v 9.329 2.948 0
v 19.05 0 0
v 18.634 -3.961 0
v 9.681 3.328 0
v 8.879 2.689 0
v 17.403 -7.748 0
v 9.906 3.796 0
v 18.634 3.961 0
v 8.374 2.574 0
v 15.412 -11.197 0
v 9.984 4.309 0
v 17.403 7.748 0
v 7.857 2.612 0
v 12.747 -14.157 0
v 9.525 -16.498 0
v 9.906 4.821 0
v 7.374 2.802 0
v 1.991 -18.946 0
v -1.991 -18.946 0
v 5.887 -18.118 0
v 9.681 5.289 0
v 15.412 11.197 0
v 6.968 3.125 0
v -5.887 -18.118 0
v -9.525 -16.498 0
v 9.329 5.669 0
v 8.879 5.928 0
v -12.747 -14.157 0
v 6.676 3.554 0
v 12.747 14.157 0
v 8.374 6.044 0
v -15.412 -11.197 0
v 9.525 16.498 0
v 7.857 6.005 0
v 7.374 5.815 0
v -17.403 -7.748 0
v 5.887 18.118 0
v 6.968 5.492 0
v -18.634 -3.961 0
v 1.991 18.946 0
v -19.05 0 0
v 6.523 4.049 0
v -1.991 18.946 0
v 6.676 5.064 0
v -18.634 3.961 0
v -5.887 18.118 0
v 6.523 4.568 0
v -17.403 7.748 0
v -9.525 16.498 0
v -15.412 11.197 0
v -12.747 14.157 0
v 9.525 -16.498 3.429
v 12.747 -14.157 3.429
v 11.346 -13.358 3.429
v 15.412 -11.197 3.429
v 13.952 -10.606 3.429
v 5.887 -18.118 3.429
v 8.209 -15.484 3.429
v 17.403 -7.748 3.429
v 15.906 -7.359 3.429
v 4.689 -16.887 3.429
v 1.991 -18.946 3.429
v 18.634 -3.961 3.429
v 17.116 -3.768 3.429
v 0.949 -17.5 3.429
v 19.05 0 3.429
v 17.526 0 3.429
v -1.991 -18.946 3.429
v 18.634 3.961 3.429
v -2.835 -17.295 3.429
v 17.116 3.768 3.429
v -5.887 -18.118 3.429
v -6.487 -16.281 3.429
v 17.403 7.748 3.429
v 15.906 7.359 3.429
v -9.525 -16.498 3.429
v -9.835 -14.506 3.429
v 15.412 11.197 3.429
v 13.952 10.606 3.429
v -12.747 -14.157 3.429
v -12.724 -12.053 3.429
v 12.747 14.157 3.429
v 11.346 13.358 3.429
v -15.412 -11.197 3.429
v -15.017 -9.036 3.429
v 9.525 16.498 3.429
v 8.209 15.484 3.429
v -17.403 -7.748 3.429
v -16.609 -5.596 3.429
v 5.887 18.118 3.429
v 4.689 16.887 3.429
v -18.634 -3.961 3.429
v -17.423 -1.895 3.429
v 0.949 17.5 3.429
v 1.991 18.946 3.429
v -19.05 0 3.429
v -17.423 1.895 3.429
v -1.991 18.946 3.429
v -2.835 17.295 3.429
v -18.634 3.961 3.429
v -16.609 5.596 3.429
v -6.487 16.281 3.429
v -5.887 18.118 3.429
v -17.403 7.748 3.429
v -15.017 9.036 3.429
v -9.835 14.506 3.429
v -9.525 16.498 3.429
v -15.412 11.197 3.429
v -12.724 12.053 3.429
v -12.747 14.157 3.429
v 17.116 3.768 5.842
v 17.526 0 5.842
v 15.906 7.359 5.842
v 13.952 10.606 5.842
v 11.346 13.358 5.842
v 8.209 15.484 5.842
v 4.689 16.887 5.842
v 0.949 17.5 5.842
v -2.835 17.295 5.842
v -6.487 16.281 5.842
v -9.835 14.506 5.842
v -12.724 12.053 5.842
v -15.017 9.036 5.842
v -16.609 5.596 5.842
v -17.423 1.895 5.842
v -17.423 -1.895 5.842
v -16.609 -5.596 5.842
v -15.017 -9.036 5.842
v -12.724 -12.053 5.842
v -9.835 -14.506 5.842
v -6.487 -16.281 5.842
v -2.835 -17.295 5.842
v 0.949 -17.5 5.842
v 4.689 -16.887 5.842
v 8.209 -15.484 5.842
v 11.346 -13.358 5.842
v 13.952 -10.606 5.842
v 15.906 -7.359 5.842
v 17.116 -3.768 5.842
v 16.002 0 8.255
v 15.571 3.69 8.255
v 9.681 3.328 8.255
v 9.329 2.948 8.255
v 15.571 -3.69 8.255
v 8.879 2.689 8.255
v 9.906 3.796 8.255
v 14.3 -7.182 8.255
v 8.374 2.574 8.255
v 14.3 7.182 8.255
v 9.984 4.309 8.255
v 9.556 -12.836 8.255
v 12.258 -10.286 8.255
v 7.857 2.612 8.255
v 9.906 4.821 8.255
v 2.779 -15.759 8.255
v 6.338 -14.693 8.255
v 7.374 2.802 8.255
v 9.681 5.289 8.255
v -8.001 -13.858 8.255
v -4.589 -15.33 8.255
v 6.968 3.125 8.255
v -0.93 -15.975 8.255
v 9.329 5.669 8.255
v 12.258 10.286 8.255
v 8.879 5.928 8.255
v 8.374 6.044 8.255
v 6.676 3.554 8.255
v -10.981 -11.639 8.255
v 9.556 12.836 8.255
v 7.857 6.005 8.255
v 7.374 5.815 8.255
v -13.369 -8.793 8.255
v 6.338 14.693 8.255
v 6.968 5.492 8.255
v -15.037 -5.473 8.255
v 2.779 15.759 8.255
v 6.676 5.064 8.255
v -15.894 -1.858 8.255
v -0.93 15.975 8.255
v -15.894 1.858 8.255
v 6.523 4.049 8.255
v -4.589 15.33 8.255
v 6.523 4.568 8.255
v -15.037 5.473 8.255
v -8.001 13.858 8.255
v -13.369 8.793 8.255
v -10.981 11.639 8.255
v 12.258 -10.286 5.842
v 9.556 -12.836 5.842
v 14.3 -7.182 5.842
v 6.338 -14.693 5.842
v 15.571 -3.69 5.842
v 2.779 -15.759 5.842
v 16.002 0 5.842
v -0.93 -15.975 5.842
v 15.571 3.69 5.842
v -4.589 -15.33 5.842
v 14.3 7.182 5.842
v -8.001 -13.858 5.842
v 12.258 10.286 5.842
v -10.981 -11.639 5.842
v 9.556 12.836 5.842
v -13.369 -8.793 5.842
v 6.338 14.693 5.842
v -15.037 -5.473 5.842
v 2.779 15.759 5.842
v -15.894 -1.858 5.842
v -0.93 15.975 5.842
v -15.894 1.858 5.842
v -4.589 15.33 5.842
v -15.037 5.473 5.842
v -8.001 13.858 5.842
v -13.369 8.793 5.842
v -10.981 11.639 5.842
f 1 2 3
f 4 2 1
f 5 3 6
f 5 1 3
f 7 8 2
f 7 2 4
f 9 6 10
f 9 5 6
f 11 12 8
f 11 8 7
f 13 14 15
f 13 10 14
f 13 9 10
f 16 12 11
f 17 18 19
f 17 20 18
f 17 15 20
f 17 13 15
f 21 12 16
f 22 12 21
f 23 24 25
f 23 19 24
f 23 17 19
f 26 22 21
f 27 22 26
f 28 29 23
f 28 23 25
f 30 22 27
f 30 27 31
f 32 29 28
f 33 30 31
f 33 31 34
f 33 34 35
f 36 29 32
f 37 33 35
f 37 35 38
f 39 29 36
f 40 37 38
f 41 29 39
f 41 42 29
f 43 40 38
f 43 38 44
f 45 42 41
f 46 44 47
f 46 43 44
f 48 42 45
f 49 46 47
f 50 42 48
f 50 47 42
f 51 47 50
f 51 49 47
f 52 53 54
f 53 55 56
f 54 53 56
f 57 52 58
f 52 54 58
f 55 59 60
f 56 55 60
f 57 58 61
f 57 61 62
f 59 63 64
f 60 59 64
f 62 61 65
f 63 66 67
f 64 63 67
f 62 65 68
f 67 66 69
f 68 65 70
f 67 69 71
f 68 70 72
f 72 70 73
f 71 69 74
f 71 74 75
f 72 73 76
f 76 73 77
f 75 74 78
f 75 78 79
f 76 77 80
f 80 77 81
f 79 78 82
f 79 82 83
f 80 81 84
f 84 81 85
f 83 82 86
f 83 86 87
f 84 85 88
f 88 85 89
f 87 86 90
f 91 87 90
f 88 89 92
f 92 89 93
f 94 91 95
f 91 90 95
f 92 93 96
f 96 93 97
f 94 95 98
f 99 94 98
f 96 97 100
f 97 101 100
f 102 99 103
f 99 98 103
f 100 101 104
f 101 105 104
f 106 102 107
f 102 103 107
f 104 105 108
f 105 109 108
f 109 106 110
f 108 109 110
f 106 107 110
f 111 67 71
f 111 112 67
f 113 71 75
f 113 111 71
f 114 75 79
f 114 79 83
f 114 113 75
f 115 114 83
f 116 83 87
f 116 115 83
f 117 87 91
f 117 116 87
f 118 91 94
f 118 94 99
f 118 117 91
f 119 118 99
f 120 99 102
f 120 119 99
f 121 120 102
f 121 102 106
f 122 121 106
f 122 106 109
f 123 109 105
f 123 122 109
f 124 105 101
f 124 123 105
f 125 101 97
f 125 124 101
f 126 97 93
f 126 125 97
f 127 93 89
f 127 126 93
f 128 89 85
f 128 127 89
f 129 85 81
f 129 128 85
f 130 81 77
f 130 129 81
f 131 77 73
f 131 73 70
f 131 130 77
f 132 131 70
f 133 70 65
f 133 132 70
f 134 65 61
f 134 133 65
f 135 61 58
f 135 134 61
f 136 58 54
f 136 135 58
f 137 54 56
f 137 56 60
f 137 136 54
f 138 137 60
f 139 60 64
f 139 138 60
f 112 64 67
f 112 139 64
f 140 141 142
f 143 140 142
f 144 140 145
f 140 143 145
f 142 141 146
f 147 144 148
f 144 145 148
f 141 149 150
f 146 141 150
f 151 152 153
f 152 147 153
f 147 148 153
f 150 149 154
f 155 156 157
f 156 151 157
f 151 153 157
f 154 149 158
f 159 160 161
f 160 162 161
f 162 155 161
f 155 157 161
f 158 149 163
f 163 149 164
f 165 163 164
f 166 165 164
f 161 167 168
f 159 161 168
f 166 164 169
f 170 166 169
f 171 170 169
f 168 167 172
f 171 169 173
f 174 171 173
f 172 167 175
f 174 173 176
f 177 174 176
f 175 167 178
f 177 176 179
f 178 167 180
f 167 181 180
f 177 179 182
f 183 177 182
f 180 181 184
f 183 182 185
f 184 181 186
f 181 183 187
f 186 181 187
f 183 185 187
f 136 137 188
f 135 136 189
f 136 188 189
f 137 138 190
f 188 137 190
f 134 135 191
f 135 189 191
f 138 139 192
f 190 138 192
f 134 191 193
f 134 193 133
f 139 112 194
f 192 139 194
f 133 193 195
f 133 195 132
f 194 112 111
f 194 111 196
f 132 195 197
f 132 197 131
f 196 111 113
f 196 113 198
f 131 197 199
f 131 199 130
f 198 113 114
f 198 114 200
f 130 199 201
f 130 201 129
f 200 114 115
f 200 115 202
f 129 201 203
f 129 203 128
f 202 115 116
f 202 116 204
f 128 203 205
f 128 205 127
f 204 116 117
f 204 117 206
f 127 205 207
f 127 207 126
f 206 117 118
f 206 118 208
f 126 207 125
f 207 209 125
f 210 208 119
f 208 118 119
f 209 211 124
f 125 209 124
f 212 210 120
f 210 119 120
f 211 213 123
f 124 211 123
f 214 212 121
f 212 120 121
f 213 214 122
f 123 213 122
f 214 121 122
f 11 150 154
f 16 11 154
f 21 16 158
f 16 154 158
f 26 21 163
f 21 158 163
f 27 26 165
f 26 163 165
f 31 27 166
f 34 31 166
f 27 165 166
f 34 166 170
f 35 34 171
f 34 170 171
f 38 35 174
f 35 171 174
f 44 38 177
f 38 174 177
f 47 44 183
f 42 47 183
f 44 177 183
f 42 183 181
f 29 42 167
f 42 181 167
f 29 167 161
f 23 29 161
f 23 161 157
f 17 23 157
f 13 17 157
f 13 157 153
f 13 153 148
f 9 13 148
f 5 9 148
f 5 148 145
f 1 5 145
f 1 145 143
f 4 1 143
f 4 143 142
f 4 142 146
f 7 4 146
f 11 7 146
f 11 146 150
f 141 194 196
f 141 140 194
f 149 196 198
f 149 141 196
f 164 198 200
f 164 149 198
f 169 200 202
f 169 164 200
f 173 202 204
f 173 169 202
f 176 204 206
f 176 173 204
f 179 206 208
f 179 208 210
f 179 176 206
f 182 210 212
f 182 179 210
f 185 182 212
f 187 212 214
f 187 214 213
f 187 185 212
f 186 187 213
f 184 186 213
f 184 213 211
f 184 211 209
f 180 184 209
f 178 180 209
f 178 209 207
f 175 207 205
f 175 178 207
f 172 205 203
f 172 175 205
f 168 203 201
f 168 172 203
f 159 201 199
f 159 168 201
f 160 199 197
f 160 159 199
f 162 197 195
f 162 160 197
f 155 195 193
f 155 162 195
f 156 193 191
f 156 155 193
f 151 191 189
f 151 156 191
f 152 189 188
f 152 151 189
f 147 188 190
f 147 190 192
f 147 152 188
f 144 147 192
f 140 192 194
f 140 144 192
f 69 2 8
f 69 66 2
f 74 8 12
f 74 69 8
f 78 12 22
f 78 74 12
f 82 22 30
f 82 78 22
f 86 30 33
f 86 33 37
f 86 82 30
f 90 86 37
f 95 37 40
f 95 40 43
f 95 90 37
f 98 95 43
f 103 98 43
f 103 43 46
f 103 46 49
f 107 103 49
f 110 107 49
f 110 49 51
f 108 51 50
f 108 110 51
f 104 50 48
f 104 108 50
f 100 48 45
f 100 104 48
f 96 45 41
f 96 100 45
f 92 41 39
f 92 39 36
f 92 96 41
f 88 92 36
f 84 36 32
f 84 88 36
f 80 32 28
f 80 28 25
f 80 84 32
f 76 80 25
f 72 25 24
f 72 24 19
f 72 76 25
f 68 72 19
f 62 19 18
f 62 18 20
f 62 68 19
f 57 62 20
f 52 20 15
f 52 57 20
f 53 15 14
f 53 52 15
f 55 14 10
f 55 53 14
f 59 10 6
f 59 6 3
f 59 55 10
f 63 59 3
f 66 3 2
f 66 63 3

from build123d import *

# Parameters (mm, degrees)
F0_W     = 19.05
F0_H     = 3.429
F2_W     = 17.526
F2_H     = 2.413
F4_W     = 16.002
F4_H     = 2.413
F6_R     = 1.7399
F7_DEPTH = 8.256


with BuildPart() as f1:
    # F0 (on Front) → F1 (revolve)
    with BuildSketch(Plane.XZ):
        with Locations((9.525, 1.7145)):
            Rectangle(F0_W, F0_H)
    revolve(axis=Axis((0, 0, 1.7145), (0, 0, 1)))

    # F2 (on Front) → F3 (revolve)
    with BuildSketch(Plane.XZ):
        with Locations((8.763, 4.6355)):
            Rectangle(F2_W, F2_H)
    revolve(axis=Axis((0, 0, 4.6355), (0, 0, 1)))

    # F4 (on Front) → F5 (revolve)
    with BuildSketch(Plane.XZ):
        with Locations((8.001, 7.0485)):
            Rectangle(F4_W, F4_H)
    revolve(axis=Axis((0, 0, 7.0485), (0, 0, 1)))

    # F6 (on face) → F7 (cut, through all)
    with BuildSketch(Plane.XY.offset(8.255)):
        with Locations((8.243714, 4.308599)):
            Circle(F6_R)
    extrude(amount=-F7_DEPTH, mode=Mode.SUBTRACT)


solid = f1.part
